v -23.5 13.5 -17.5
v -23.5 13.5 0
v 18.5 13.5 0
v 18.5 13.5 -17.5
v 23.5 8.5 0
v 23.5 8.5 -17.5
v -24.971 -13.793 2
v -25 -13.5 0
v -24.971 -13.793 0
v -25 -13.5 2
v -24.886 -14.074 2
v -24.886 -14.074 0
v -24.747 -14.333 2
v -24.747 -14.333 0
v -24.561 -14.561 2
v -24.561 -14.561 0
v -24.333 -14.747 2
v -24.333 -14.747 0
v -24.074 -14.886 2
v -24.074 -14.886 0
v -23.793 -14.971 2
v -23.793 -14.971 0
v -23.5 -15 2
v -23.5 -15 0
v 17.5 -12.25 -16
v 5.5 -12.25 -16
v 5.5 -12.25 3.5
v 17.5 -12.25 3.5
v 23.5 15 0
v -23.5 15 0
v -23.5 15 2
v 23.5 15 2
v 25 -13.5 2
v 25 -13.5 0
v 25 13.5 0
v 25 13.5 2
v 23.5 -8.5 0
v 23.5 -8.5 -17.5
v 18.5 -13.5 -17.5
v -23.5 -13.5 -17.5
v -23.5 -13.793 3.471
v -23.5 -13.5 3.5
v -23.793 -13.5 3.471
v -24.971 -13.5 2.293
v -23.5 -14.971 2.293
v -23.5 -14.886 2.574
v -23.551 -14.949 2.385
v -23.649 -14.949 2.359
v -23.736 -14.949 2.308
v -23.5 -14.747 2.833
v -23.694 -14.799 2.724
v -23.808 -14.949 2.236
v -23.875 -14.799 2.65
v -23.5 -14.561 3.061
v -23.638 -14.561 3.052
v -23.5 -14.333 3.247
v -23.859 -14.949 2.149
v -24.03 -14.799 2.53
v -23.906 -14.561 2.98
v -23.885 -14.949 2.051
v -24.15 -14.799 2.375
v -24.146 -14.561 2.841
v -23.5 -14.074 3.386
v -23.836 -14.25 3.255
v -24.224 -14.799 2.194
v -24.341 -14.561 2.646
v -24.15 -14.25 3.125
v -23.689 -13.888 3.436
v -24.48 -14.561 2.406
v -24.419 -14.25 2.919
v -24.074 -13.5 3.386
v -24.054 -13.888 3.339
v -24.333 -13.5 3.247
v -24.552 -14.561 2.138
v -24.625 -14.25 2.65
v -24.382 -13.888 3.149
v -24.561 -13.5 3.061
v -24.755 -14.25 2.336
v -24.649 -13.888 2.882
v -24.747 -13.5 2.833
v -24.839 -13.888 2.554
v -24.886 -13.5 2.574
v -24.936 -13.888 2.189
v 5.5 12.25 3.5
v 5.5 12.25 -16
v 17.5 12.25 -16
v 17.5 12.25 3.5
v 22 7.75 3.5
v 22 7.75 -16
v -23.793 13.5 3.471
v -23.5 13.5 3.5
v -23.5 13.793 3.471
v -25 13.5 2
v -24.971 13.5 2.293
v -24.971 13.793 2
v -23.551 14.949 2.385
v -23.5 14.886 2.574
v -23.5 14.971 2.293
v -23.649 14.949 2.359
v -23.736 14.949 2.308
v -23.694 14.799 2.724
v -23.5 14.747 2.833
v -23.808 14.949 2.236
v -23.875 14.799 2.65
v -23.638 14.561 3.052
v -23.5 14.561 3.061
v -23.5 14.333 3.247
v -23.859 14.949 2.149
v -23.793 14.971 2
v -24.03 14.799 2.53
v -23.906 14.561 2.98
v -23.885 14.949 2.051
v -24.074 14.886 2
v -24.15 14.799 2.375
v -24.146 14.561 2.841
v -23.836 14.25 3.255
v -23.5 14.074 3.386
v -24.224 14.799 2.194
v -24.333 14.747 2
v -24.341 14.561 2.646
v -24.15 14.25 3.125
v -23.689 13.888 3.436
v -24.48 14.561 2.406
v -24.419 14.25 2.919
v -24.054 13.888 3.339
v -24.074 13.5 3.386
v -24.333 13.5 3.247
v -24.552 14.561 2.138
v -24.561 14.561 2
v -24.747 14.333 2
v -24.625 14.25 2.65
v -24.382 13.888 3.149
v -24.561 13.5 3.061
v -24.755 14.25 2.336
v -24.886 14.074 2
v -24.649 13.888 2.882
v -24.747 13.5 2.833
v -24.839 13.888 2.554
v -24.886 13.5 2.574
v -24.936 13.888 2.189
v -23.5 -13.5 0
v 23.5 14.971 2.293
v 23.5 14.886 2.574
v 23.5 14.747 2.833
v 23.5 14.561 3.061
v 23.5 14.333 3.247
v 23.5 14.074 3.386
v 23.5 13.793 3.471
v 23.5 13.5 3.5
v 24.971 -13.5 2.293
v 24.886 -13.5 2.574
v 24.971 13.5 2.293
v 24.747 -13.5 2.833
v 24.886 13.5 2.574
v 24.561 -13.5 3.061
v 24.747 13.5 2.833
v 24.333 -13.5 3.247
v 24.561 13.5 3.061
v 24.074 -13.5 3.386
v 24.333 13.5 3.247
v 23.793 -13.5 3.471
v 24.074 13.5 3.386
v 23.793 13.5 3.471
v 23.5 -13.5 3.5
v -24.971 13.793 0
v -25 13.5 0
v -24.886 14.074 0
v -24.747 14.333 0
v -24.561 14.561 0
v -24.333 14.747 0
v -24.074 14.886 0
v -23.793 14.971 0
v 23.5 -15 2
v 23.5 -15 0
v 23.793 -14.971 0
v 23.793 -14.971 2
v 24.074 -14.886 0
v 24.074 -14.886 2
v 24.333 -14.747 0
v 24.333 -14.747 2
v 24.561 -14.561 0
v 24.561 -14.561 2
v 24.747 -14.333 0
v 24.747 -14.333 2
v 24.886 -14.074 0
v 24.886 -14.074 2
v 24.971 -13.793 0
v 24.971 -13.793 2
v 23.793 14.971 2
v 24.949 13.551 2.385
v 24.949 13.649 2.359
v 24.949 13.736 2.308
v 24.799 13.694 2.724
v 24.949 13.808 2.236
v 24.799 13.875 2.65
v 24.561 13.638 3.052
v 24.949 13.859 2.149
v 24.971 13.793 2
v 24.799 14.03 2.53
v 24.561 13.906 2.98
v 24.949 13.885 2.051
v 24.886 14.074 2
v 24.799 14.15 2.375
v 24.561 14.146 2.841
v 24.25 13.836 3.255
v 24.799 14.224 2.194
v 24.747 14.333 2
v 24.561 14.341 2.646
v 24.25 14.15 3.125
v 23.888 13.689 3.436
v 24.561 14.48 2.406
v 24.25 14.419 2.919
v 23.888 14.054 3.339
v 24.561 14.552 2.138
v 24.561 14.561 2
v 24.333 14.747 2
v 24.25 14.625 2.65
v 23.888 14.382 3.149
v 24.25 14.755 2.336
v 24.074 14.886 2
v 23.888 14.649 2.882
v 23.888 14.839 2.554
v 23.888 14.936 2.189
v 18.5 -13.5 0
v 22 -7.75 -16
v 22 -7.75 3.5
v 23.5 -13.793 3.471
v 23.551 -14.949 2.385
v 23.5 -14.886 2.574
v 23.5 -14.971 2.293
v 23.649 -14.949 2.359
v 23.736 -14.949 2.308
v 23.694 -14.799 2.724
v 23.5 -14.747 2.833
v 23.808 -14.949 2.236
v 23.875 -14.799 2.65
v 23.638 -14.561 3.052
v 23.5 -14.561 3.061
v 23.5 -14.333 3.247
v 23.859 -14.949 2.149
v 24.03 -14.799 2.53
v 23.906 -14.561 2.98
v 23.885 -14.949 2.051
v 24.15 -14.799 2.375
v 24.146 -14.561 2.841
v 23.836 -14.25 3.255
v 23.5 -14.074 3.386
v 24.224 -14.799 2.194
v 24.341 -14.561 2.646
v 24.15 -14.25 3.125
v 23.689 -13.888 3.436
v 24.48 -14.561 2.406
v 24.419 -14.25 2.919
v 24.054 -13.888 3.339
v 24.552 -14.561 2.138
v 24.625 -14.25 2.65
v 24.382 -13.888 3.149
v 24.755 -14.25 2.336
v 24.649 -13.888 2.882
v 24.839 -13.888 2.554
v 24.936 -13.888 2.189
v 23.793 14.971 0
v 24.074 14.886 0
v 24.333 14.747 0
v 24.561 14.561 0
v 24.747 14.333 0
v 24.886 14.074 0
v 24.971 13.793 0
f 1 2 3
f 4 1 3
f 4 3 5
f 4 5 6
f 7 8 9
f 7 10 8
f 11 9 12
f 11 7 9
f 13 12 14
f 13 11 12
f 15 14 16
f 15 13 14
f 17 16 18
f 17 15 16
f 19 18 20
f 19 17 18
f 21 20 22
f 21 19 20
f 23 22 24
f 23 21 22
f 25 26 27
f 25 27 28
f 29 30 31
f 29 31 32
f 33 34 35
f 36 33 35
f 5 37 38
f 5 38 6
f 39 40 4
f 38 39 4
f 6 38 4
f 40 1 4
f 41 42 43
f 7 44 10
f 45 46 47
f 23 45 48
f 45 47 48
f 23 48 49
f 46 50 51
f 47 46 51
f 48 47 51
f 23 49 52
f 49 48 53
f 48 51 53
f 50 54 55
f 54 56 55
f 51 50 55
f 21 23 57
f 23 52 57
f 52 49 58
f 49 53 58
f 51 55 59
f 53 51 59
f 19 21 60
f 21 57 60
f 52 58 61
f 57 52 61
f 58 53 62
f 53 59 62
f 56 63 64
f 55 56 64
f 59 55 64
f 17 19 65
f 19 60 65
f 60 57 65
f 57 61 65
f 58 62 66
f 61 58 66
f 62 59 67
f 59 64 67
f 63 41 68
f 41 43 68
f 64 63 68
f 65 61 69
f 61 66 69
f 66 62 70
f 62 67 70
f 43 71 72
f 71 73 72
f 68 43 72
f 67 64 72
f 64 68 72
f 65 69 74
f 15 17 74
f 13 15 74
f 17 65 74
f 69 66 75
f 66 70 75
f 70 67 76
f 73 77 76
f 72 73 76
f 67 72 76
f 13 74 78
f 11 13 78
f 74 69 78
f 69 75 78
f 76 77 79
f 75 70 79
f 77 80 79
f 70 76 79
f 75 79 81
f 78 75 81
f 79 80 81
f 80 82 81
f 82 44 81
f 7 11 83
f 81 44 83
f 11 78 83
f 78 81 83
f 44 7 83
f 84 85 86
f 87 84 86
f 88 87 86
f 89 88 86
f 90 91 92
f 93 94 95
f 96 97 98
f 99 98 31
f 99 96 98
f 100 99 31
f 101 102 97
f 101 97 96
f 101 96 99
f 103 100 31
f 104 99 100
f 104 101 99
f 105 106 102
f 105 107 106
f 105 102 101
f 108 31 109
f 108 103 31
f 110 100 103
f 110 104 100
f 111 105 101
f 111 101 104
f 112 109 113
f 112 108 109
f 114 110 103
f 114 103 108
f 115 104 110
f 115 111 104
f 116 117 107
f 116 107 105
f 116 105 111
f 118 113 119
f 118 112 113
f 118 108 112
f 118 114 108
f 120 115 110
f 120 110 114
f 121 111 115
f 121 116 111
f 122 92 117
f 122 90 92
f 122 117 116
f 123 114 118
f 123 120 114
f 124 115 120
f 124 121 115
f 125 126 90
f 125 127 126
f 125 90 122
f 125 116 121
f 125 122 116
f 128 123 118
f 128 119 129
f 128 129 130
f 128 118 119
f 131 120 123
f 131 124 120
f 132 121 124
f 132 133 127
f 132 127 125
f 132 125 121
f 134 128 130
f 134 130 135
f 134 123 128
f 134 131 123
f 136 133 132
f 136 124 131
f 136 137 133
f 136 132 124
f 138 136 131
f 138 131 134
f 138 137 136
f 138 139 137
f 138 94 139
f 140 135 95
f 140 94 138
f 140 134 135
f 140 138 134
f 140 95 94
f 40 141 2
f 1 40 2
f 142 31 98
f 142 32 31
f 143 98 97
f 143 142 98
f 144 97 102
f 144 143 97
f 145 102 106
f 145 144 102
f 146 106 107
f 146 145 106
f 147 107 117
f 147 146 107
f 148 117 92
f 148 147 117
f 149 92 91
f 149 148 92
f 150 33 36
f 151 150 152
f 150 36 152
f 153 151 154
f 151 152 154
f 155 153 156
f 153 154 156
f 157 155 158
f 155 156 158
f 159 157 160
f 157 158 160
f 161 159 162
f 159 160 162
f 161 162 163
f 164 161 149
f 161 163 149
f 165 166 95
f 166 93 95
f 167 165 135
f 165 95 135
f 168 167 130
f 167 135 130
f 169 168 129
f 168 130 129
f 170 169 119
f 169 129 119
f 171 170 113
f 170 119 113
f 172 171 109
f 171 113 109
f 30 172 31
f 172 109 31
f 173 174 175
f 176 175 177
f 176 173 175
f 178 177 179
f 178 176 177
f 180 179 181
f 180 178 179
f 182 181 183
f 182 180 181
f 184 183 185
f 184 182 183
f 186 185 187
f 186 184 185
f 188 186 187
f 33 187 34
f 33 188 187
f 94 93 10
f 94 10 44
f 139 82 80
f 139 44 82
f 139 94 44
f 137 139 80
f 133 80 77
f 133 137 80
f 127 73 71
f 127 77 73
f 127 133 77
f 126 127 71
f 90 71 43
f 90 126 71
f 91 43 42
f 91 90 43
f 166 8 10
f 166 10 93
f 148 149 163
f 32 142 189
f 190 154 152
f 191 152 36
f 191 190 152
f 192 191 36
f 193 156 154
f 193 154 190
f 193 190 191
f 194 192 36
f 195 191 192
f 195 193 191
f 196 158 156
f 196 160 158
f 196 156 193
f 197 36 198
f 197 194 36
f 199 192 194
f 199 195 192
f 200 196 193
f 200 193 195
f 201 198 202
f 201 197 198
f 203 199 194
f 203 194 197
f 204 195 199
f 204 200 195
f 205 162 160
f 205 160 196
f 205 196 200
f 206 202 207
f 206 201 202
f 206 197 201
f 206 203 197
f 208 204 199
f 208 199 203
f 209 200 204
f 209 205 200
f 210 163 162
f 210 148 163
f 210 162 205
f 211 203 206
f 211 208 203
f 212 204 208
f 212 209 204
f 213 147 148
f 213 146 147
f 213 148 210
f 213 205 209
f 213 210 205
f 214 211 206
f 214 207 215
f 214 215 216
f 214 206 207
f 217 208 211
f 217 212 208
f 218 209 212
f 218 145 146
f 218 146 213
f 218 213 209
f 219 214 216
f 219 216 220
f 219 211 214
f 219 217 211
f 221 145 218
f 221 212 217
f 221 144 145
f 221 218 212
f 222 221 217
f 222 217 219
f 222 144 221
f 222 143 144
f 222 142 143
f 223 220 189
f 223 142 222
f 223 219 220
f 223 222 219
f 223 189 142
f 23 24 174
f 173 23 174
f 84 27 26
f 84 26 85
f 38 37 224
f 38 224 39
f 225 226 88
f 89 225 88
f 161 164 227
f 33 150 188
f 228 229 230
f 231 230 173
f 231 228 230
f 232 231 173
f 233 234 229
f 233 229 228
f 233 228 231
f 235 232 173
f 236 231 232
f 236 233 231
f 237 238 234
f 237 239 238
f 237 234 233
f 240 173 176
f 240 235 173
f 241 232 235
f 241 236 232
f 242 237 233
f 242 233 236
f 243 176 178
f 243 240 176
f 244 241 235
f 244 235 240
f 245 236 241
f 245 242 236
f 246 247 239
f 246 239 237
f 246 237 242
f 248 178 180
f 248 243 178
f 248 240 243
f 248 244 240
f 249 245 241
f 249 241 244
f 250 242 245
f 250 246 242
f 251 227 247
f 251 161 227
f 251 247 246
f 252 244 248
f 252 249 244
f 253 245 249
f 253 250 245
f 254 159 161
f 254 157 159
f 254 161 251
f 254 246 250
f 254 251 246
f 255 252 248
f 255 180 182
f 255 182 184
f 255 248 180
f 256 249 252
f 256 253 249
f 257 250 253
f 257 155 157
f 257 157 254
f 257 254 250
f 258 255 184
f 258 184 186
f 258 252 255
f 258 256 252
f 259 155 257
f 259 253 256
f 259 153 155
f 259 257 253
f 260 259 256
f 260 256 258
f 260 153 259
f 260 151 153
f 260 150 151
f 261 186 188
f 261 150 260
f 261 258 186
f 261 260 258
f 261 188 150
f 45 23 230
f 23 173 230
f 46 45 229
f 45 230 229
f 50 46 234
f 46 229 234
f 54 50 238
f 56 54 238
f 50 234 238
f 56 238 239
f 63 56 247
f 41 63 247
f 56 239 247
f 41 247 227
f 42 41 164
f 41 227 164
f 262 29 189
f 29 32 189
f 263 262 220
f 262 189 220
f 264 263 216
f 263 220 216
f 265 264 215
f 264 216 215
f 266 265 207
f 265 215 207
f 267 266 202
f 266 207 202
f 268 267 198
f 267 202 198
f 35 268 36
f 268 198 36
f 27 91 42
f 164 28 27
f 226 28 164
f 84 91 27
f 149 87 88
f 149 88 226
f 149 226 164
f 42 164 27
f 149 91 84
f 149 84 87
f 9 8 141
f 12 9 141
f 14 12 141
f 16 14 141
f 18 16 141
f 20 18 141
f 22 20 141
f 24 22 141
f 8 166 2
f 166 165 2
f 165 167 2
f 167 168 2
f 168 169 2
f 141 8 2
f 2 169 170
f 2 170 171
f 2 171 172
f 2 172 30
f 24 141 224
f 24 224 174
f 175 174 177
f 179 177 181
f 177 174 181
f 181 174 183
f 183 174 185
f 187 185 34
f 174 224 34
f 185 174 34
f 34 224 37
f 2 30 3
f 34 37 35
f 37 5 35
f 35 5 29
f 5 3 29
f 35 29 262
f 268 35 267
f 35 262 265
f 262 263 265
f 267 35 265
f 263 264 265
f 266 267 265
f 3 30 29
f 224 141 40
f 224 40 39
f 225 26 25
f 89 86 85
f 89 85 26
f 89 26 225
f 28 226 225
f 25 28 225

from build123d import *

# Parameters (mm, degrees)
F0_W     = 47
F0_H     = 27
F1_DEPTH = 17.5
F0_W_2   = 50
F0_H_2   = 30
F2_DEPTH = 3.5
F3_W     = 16.5
F3_H     = 24.5
F4_DEPTH = 19.5
F5_SIZE  = 4.5
F6_SIZE  = 5
F7_R     = 1.5


with BuildPart() as f1:
    # F0 (on Top) → F1 (new body)
    with BuildSketch(Plane.XY):
        Rectangle(F0_W, F0_H)
    extrude(amount=-F1_DEPTH)

    # F0 (on Top) → F2 (join)
    with BuildSketch(Plane.XY):
        Rectangle(F0_W_2, F0_H_2)
        Rectangle(F0_W, F0_H, mode=Mode.SUBTRACT)
        Rectangle(F0_W, F0_H)
    extrude(amount=F2_DEPTH)

    # F3 (on face) → F4 (cut)
    with BuildSketch(Plane.XY.offset(3.5)):
        with Locations((13.75, 0)):
            Rectangle(F3_W, F3_H)
    extrude(amount=-F4_DEPTH, mode=Mode.SUBTRACT)

    # F5
    f5_edges = [f1.edges().sort_by_distance(p)[0] for p in [
        (22, 12.25, -6.25),
        (22, -12.25, -6.25),
    ]]
    chamfer(f5_edges, length=F5_SIZE)

    # F6
    f6_edges = [f1.edges().sort_by_distance(p)[0] for p in [
        (23.5, 13.5, -8.75),
        (23.5, -13.5, -8.75),
    ]]
    chamfer(f6_edges, length=F6_SIZE)

    # F7
    f7_edges = [f1.edges().sort_by_distance(p)[0] for p in [
        (-25, 0, 3.5),
        (0, 15, 3.5),
        (25, 0, 3.5),
        (0, -15, 3.5),
        (25, -15, 1.75),
        (25, 15, 1.75),
        (-25, -15, 1.75),
        (-25, 15, 1.75),
    ]]
    fillet(f7_edges, radius=F7_R)


solid = f1.part
